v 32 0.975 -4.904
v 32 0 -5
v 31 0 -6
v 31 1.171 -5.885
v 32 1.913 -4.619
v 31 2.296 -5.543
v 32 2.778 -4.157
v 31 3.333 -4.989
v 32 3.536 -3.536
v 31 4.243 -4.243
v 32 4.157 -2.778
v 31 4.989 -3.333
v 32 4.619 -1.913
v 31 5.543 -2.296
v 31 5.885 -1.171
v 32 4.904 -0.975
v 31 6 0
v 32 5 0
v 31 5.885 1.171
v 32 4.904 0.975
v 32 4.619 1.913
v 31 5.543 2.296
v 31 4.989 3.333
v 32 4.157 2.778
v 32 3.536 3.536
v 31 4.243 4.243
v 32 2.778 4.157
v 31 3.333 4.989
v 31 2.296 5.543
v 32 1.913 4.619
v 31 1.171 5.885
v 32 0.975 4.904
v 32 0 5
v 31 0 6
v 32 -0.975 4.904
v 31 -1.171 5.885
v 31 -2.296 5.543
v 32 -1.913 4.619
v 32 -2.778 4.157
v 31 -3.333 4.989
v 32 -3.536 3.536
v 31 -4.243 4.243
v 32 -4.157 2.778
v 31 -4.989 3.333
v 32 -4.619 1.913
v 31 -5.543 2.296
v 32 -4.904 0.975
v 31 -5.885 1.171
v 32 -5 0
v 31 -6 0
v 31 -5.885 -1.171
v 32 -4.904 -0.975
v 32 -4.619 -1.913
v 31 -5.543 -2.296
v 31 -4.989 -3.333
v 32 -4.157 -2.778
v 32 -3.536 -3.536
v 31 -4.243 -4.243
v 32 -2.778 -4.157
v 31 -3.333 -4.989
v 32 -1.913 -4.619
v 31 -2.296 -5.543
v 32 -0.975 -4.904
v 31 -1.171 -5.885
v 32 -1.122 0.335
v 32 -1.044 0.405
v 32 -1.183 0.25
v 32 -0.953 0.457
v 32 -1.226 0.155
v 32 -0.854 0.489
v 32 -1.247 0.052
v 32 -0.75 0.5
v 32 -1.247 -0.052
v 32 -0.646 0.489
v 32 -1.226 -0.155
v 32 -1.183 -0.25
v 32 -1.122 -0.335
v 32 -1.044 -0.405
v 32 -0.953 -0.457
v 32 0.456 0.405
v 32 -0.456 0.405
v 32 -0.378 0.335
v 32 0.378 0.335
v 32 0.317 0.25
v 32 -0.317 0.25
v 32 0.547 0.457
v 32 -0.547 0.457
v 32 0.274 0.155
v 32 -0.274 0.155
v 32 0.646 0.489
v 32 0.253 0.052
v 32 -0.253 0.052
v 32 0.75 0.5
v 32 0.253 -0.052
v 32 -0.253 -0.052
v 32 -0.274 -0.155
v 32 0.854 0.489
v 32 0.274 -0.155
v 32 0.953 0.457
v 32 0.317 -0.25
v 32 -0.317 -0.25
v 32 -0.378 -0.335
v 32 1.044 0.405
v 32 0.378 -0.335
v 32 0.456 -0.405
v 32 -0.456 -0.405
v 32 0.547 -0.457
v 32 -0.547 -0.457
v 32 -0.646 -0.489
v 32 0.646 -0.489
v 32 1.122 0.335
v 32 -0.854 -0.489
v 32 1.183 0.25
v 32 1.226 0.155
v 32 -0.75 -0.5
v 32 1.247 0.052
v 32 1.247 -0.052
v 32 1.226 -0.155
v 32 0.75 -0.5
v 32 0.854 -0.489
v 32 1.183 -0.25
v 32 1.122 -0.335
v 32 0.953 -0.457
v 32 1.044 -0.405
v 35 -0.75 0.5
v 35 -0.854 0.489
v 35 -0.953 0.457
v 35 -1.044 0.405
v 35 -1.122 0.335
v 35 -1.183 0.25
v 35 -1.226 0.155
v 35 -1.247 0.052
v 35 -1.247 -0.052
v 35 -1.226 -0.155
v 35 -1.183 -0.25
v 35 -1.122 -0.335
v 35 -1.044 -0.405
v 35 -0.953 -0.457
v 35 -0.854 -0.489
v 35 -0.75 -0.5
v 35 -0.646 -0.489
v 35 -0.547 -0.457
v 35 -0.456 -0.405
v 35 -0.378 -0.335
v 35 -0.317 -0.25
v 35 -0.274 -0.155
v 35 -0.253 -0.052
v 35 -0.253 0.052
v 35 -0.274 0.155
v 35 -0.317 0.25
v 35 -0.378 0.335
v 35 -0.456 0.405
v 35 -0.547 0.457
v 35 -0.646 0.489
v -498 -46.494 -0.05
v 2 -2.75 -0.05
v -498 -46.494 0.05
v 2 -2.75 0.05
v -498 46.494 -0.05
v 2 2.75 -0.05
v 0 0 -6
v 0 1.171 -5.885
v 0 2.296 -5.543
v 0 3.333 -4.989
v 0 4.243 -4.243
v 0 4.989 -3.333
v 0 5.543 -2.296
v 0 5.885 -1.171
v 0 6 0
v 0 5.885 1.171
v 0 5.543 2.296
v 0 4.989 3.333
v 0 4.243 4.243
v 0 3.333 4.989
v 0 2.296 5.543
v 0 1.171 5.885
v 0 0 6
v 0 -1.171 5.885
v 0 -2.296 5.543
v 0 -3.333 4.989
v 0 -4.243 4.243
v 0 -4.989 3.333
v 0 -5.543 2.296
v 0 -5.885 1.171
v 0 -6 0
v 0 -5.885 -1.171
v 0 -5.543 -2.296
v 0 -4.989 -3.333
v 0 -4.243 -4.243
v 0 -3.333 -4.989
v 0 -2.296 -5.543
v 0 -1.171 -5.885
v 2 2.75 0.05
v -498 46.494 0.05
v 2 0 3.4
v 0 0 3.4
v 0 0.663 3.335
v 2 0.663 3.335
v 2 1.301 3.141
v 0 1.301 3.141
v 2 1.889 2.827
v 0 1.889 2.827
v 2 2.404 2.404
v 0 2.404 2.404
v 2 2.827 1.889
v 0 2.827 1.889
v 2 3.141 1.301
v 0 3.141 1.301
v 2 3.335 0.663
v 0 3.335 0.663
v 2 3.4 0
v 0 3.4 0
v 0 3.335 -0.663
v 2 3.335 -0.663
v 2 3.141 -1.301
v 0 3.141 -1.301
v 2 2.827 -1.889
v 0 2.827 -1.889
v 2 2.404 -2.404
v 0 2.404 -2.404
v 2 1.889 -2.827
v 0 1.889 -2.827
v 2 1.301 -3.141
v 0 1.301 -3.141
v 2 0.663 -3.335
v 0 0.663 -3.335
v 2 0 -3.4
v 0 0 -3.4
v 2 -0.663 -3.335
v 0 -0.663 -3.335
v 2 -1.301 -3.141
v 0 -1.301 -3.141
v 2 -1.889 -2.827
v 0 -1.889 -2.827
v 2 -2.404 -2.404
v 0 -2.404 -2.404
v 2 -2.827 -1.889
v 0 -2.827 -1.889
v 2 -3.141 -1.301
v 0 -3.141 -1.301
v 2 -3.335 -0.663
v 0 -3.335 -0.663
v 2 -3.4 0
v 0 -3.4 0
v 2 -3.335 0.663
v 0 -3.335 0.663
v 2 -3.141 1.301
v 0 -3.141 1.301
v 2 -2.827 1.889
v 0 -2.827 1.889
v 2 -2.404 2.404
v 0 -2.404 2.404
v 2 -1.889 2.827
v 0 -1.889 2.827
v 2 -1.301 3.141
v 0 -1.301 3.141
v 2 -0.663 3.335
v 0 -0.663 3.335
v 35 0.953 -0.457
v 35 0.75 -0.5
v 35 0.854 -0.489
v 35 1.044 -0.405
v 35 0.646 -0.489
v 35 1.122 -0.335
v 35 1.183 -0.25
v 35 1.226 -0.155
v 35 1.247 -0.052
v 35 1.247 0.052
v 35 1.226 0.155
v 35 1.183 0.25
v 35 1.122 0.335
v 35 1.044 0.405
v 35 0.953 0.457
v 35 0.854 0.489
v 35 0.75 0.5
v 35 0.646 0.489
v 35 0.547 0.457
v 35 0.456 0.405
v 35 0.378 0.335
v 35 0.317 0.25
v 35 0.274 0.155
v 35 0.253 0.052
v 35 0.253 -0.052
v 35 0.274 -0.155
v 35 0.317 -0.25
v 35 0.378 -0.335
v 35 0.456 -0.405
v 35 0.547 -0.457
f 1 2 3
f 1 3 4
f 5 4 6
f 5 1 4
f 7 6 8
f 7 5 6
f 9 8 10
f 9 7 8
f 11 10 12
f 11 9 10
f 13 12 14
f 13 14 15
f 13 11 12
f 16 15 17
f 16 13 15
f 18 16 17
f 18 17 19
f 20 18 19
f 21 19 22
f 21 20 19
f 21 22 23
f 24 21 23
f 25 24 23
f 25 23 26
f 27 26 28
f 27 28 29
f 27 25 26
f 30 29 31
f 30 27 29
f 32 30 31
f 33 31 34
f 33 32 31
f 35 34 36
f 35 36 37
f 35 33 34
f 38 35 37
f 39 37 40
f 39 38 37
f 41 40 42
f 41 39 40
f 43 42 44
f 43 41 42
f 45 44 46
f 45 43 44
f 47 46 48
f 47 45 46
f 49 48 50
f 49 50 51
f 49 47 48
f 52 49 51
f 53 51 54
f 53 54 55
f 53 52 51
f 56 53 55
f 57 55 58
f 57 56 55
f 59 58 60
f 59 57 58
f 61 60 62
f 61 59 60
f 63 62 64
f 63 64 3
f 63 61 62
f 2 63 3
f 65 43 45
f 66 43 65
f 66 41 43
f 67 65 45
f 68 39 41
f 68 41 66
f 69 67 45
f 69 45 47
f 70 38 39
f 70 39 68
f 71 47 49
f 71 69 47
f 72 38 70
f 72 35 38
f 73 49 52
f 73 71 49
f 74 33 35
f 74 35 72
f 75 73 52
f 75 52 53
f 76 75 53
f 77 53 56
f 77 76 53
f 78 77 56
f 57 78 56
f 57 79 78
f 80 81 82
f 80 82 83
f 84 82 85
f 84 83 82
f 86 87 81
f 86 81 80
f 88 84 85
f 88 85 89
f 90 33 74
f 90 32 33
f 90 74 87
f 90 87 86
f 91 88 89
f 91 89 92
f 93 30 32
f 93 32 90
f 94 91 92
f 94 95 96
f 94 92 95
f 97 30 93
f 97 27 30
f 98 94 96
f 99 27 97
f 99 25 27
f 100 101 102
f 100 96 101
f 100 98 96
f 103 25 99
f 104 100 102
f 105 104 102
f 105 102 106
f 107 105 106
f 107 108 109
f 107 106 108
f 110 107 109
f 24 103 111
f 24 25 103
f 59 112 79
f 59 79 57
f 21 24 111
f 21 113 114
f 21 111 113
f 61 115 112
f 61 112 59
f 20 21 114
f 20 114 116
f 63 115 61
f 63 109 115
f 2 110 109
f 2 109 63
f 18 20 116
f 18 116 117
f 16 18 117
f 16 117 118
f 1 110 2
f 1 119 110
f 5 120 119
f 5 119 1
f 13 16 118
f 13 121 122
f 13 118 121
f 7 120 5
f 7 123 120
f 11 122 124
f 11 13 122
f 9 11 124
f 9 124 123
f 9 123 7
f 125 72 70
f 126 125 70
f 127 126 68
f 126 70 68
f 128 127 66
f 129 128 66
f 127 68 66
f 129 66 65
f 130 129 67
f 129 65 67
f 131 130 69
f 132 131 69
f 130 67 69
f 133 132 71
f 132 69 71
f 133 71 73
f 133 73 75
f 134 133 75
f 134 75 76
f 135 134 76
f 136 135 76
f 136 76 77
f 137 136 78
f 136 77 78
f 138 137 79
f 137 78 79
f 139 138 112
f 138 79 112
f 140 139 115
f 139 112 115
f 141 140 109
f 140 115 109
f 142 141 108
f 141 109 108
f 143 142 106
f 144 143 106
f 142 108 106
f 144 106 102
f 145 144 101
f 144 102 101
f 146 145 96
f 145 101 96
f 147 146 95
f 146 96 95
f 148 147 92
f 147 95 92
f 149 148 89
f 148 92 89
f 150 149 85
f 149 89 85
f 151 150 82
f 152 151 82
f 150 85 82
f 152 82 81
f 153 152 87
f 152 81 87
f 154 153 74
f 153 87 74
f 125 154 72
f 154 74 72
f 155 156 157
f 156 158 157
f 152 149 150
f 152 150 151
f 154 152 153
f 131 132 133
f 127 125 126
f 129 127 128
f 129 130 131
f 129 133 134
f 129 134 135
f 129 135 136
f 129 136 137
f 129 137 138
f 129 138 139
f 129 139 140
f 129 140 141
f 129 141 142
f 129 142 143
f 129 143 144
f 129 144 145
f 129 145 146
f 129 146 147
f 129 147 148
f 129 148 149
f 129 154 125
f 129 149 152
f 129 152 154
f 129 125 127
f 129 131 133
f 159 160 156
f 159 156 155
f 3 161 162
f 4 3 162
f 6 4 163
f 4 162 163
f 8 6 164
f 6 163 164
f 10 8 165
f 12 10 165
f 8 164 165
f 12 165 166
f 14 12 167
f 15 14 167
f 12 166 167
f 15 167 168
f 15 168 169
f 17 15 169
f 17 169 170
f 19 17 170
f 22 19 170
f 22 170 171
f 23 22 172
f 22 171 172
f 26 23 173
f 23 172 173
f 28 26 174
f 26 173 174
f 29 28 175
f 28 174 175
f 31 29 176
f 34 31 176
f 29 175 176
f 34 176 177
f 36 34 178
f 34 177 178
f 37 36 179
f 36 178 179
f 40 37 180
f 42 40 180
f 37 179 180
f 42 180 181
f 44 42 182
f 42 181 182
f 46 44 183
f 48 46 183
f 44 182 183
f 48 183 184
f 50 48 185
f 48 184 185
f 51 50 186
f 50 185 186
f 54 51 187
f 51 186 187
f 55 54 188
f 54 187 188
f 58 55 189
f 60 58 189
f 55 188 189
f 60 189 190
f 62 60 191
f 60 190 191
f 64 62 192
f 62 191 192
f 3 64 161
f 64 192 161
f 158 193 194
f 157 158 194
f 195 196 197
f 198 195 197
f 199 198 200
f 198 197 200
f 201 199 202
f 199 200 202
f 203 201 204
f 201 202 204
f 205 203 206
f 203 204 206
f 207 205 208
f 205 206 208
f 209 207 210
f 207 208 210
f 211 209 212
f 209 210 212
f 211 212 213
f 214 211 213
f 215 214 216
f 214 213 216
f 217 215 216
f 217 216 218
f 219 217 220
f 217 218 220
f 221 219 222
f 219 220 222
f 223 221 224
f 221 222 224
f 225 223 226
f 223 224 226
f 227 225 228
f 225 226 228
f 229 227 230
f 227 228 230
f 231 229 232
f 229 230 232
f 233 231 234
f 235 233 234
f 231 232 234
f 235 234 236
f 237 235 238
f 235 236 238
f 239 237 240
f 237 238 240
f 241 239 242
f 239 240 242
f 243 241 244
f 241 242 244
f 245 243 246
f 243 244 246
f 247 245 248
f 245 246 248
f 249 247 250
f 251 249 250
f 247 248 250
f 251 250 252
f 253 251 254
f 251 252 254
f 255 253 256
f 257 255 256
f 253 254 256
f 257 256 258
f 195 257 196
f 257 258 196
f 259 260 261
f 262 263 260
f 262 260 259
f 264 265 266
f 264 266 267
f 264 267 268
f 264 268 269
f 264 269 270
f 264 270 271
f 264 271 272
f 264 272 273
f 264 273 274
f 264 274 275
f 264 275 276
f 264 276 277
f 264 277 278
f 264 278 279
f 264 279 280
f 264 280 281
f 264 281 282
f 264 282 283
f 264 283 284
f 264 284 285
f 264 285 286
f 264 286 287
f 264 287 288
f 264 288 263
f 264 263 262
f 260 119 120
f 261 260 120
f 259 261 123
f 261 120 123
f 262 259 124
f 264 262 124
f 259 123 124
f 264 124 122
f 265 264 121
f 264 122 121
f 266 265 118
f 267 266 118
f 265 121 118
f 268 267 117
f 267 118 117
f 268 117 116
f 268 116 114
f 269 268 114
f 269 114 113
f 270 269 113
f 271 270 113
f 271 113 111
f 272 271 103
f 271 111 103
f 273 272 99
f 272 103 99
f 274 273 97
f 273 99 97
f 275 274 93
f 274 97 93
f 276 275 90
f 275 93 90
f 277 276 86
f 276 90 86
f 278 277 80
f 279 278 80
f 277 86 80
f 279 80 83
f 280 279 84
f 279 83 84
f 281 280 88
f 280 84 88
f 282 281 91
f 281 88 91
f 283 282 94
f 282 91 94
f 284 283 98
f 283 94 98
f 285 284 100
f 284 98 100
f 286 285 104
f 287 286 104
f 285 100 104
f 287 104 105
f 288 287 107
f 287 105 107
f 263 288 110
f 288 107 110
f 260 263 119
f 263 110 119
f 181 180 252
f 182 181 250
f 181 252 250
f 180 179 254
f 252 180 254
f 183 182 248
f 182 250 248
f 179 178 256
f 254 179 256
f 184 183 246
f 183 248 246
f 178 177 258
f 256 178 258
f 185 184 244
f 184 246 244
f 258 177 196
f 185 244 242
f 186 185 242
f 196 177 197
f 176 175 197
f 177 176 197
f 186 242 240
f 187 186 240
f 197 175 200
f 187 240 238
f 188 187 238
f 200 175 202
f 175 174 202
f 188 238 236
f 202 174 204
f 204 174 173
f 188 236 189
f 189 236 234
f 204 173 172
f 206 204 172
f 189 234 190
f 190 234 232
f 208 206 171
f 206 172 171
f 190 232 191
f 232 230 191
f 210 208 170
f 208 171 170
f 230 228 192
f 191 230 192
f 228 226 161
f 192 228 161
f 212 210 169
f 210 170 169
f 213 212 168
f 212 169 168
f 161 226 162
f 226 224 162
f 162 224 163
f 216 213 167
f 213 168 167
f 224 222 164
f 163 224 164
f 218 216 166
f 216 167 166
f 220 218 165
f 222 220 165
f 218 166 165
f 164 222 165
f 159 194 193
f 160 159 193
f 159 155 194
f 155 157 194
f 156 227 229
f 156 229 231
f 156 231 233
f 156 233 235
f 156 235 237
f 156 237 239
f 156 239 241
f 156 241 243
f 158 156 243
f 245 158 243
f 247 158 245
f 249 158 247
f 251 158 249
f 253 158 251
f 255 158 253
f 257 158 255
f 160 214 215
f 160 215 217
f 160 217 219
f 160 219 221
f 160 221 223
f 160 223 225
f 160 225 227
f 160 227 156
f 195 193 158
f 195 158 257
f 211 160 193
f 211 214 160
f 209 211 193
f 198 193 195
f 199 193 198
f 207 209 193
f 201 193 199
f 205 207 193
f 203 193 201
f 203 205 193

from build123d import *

# Parameters (mm, degrees)
ESQUISSE1_R             = 6
EXTRUSION1_DEPTH        = 32
ESQUISSE2_R             = 3.4
ENL_V_MAT_EXTRU_1_DEPTH = 2
CHANFREIN1_SIZE         = 1
ESQUISSE3_R             = 0.5
EXTRUSION2_DEPTH        = 3
EXTRUSION3_DEPTH        = 0.05


with BuildPart() as part:
    # Esquisse1 → Extrusion1 (new body)
    with BuildSketch(Plane(origin=(0, 0, 0), x_dir=(0, 0, -1), z_dir=(1, 0, 0))):
        Circle(ESQUISSE1_R)
    extrude(amount=EXTRUSION1_DEPTH)

    # Esquisse2 → Enlèv. mat.-Extru.1 (cut)
    with BuildSketch(Plane.ZY):
        Circle(ESQUISSE2_R)
    extrude(amount=-ENL_V_MAT_EXTRU_1_DEPTH, mode=Mode.SUBTRACT)

    # Chanfrein1
    chanfrein1_edges = [part.edges().sort_by_distance(p)[0] for p in [
        (32, 0, 6),
    ]]
    chamfer(chanfrein1_edges, length=CHANFREIN1_SIZE)

    # Esquisse3 → Extrusion2 (add)
    with BuildSketch(Plane(origin=(32, 0, 0), x_dir=(0, 0, -1), z_dir=(1, 0, 0))):
        with Locations((0, 0.75)):
            Circle(ESQUISSE3_R)
        with Locations(Location((0, -0.75, 0), (0, 0, 180))):
            Circle(ESQUISSE3_R)
    extrude(amount=EXTRUSION2_DEPTH)

    # Esquisse4 → Extrusion3 (add, symmetric)
    with BuildSketch(Plane.XY):
        Polygon((2, 2.75), (2, -2.75), (-498, -46.494331763), (-498, 46.494331763), align=None)
    extrude(amount=EXTRUSION3_DEPTH, both=True)


solid = part.part
